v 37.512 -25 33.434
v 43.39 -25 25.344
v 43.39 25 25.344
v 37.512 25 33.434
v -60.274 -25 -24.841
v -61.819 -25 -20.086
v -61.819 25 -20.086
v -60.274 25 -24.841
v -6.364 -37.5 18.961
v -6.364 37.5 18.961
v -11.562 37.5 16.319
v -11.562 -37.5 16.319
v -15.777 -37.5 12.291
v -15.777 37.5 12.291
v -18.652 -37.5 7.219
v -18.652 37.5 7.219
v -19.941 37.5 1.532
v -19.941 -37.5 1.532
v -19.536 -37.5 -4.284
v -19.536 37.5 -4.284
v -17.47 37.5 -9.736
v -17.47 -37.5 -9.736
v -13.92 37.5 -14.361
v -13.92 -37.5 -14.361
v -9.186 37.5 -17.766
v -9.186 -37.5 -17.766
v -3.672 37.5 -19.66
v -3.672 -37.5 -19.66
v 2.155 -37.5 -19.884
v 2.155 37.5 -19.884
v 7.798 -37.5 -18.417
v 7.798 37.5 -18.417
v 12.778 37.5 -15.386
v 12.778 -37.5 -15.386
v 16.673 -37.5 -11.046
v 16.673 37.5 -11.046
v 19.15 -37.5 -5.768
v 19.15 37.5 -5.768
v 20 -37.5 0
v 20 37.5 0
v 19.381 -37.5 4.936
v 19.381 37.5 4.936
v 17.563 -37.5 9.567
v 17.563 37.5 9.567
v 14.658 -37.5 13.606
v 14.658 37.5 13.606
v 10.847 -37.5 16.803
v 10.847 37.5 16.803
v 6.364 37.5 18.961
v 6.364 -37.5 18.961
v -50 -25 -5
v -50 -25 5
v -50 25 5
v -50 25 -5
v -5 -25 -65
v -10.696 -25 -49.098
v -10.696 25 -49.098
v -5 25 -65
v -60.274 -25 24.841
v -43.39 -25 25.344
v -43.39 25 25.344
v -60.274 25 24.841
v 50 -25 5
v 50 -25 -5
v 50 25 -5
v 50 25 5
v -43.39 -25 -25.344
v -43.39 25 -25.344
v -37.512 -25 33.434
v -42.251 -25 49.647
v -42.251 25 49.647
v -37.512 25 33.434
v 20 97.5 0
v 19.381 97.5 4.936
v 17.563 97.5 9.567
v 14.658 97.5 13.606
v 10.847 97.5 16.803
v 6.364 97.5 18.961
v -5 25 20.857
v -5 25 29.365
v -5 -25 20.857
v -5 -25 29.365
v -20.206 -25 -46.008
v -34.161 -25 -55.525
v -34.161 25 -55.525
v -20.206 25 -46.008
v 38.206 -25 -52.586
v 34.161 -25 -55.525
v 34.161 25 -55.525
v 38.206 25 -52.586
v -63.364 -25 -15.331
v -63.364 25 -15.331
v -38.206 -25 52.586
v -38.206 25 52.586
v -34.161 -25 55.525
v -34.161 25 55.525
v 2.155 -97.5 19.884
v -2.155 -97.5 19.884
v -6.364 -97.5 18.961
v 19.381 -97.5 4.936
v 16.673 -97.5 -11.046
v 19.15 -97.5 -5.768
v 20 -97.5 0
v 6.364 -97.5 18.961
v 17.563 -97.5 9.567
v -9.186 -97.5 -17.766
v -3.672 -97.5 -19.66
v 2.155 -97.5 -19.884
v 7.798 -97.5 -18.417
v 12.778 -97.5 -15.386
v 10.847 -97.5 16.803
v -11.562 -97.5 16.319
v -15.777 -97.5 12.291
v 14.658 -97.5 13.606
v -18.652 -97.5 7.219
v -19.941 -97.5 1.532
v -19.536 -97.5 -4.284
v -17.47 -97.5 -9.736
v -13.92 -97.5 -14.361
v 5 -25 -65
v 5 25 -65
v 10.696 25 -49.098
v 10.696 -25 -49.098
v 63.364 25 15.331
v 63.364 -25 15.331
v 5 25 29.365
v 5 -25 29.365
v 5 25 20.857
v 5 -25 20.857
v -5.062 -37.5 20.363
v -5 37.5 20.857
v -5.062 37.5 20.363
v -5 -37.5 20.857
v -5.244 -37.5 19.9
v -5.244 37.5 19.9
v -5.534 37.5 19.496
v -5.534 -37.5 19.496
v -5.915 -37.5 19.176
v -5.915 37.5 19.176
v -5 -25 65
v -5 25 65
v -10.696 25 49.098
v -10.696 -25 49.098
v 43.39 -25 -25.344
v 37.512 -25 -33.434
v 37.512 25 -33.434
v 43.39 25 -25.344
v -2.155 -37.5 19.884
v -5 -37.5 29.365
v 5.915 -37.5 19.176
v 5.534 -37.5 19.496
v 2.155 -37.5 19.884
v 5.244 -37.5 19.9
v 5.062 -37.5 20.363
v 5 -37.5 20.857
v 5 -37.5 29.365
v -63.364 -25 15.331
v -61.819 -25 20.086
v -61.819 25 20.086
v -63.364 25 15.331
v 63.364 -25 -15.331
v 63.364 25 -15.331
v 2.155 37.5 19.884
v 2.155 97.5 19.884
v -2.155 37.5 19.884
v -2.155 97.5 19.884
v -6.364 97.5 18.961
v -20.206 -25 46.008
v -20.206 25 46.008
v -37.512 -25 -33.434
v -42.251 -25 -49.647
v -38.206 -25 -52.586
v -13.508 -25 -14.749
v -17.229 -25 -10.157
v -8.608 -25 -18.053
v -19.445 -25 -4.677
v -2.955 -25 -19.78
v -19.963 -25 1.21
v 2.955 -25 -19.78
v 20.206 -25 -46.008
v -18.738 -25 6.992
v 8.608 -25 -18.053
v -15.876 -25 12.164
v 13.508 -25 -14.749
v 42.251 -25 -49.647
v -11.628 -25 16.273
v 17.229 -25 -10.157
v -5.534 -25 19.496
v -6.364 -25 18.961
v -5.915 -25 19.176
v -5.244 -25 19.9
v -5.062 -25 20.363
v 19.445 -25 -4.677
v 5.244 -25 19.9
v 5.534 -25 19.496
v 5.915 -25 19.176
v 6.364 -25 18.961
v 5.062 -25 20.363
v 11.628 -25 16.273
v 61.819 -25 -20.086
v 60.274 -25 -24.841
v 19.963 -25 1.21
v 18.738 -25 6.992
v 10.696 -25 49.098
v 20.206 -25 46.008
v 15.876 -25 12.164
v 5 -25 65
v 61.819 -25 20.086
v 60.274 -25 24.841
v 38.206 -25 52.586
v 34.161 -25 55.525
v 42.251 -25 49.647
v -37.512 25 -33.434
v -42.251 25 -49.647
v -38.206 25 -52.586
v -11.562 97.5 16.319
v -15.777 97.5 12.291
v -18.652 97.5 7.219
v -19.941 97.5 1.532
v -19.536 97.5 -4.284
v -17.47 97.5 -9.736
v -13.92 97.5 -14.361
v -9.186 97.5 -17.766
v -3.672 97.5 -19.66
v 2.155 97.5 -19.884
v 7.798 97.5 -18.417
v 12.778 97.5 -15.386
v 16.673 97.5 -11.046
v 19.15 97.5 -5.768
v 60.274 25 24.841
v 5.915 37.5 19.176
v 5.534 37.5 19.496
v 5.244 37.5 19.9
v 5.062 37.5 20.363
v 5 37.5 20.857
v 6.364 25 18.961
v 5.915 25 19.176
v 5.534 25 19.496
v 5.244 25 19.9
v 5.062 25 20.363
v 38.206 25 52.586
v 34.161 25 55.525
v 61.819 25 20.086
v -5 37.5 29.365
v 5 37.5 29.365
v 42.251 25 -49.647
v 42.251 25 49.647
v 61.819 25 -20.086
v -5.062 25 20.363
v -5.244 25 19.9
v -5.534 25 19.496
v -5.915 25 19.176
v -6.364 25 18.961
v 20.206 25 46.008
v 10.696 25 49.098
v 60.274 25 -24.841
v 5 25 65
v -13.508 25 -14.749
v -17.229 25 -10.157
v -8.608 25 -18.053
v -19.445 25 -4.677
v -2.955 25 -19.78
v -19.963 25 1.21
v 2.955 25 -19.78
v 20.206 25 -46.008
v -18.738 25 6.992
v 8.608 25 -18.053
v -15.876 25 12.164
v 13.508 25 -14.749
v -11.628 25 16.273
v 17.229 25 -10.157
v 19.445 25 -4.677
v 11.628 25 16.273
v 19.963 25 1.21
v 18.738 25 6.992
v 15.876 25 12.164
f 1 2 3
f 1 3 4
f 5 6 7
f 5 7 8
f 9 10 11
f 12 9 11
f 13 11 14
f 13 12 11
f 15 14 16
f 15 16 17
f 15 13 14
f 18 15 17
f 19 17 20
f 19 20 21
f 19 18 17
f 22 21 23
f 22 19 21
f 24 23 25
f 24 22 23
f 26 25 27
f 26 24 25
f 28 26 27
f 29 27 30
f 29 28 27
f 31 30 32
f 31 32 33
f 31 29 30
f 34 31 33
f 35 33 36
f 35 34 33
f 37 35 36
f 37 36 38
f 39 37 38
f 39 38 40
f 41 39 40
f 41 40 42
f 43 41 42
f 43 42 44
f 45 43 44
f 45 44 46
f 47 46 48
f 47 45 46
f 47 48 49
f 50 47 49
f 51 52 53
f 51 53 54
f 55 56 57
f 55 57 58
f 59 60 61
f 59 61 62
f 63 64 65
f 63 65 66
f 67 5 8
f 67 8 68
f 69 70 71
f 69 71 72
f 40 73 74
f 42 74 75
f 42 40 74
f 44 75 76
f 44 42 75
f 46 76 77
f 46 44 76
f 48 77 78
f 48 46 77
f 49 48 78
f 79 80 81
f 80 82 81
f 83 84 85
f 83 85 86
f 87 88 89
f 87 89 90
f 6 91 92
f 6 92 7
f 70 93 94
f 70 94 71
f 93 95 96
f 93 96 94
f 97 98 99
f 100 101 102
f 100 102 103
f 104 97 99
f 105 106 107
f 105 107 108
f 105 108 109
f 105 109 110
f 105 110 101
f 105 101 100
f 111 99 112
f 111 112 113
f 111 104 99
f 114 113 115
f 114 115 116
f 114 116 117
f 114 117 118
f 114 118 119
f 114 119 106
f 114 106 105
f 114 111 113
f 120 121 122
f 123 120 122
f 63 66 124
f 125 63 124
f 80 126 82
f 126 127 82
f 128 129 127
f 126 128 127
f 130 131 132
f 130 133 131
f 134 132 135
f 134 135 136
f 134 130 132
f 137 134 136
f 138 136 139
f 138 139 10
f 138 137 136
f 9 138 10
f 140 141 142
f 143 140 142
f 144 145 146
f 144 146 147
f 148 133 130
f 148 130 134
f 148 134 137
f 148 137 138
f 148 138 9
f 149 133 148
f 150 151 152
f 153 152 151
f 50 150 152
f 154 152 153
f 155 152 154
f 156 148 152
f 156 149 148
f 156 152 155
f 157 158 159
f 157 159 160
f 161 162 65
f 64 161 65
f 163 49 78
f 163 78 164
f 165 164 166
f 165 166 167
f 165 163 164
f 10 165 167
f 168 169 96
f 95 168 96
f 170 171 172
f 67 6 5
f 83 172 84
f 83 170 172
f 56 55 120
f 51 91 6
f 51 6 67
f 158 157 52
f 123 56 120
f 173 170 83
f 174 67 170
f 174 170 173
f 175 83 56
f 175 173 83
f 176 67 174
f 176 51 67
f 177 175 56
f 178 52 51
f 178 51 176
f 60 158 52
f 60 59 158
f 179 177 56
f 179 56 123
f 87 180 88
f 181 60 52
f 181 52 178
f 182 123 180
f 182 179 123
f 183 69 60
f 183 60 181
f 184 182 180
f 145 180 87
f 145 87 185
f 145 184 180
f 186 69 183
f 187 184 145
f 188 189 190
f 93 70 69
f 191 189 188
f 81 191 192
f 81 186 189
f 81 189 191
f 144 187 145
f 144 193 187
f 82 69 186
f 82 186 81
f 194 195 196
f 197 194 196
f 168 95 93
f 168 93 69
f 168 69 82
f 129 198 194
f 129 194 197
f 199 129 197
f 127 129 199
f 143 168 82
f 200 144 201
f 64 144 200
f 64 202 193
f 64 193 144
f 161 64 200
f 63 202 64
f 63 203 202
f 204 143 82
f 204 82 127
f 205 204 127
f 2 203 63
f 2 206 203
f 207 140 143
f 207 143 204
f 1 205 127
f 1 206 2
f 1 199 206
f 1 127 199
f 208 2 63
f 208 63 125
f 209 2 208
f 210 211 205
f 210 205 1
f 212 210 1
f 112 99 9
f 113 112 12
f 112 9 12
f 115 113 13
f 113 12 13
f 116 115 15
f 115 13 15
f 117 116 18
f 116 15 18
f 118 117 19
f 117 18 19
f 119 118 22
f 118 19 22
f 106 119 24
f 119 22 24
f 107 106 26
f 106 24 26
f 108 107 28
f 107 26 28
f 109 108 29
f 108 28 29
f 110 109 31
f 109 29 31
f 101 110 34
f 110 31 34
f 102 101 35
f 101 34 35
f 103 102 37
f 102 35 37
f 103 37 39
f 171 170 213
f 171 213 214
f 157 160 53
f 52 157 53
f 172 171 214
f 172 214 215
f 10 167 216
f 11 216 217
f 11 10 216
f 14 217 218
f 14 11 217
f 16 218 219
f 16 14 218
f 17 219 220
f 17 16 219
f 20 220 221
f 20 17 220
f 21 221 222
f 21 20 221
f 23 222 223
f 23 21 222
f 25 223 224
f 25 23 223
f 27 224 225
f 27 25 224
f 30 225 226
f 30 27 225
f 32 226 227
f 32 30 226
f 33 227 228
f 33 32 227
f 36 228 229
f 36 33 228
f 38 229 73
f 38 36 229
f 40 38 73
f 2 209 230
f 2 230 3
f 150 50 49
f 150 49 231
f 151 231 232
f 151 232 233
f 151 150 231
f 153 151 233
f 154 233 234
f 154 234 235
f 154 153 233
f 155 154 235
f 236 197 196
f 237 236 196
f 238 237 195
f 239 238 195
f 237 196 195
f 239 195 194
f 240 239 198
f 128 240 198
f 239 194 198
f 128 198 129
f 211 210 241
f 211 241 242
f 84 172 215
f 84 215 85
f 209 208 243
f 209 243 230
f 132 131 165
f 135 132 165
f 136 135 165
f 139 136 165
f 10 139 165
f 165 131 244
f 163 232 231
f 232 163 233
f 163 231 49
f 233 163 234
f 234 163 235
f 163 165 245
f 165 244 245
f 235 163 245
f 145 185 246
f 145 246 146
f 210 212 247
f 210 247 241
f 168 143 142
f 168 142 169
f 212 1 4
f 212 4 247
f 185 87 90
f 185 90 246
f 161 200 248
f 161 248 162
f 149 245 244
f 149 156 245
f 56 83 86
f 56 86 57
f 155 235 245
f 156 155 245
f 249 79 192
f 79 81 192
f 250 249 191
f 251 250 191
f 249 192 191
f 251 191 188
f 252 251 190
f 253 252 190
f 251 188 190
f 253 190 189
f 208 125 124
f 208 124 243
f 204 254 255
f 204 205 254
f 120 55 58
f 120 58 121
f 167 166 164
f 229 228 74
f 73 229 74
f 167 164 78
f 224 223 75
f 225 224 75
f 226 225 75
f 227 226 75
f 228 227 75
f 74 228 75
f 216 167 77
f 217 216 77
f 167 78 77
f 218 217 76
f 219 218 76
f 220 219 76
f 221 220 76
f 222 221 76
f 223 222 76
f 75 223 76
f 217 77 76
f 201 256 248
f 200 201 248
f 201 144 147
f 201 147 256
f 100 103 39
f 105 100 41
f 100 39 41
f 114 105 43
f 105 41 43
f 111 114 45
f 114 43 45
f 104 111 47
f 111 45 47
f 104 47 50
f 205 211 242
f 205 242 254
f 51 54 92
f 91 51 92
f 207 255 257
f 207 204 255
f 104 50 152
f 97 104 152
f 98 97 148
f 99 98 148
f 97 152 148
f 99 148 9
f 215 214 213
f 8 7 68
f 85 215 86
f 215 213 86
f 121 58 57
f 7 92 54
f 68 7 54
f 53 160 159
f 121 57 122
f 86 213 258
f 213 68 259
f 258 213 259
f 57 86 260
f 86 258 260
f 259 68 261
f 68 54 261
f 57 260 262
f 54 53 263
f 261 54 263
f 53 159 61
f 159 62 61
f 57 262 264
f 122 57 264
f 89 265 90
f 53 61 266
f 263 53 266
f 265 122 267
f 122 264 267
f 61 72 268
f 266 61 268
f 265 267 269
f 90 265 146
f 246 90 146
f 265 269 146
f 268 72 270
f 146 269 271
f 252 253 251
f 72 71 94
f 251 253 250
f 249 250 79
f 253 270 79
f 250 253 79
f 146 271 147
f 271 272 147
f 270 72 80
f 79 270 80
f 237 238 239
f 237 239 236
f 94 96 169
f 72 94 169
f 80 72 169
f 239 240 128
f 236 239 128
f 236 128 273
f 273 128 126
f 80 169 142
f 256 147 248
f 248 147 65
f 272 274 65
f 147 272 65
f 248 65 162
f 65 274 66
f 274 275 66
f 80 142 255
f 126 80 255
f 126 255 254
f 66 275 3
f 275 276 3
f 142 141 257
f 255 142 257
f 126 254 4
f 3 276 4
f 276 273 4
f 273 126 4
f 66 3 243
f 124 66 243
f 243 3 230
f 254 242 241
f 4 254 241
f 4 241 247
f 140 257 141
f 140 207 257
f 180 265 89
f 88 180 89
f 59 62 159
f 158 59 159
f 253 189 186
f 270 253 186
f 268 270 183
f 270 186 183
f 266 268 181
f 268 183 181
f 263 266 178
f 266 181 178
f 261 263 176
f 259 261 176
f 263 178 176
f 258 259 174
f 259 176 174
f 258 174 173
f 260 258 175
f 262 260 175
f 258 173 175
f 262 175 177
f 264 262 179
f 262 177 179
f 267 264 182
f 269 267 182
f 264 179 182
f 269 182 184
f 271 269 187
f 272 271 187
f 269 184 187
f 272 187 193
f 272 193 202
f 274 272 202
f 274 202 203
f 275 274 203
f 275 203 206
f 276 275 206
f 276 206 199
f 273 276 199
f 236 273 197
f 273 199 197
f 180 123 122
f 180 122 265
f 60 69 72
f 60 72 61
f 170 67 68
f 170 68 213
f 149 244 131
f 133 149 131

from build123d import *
from build123d import SkipClean  # not in build123d's __all__

# Parameters (mm, degrees)
F1_DEPTH = 25
F3_DEPTH = 25
F4_DEPTH = 37.5
F6_DEPTH = 60


with BuildPart() as f1:
    # F0 (on Front) → F1 (new body, symmetric)
    with BuildSketch(Plane.XZ):
        Polygon((5, 65), (0, 65), (-5, 65), (-10.6955671373, 49.0979107866), (-20.2061323002, 46.0077408429), (-34.1609564271, 55.5250308958), (-38.206041399, 52.5861046344), (-42.2511263709, 49.6471783729), (-37.5119234573, 33.4343475865), (-43.3897759802, 25.3441776427), (-60.2735885873, 24.8413872158), (-61.8186735592, 20.0861046344), (-63.3637585311, 15.3308220529), (-50, 5), (-50, -5), (-63.3637585311, -15.3308220529), (-61.8186735592, -20.0861046344), (-60.2735885873, -24.8413872158), (-43.3897759802, -25.3441776427), (-37.5119234573, -33.4343475865), (-42.2511263709, -49.6471783729), (-38.206041399, -52.5861046344), (-34.1609564271, -55.5250308958), (-20.2061323002, -46.0077408429), (-10.6955671373, -49.0979107866), (-5, -65), (0, -65), (5, -65), (10.6955671373, -49.0979107866), (20.2061323002, -46.0077408429), (34.1609564271, -55.5250308958), (38.206041399, -52.5861046344), (42.2511263709, -49.6471783729), (37.5119234573, -33.4343475865), (43.3897759802, -25.3441776427), (60.2735885873, -24.8413872158), (61.8186735592, -20.0861046344), (63.3637585311, -15.3308220529), (50, -5), (50, 5), (63.3637585311, 15.3308220529), (61.8186735592, 20.0861046344), (60.2735885873, 24.8413872158), (43.3897759802, 25.3441776427), (37.5119234573, 33.4343475865), (42.2511263709, 49.6471783729), (38.206041399, 52.5861046344), (34.1609564271, 55.5250308958), (20.2061323002, 46.0077408429), (10.6955671373, 49.0979107866), align=None)
    extrude(amount=F1_DEPTH, both=True)

    # F2 (on Front) → F3 (cut, symmetric)
    with BuildSketch(Plane.XZ):
        with BuildLine():
            ThreePointArc((-5, 20.8566536146), (-5.3763117182, 19.6889051984), (-6.3636363636, 18.9605941951))
            ThreePointArc((-6.3636363636, 18.9605941951), (0, -20), (6.3636363636, 18.9605941951))
            ThreePointArc((6.3636363636, 18.9605941951), (5.3763117182, 19.6889051984), (5, 20.8566536146))
            Line((5, 20.8566536146), (5, 29.364916731))
            Line((5, 29.364916731), (-5, 29.364916731))
            Line((-5, 29.364916731), (-5, 20.8566536146))
        make_face()
    extrude(amount=F3_DEPTH, both=True, mode=Mode.SUBTRACT)


with BuildPart() as f4:
    # F2 (on Front) → F4 (new body, symmetric)
    with BuildSketch(Plane.XZ):
        with BuildLine():
            ThreePointArc((-5, 20.8566536146), (-5.3763117182, 19.6889051984), (-6.3636363636, 18.9605941951))
            ThreePointArc((-6.3636363636, 18.9605941951), (0, -20), (6.3636363636, 18.9605941951))
            ThreePointArc((6.3636363636, 18.9605941951), (5.3763117182, 19.6889051984), (5, 20.8566536146))
            Line((5, 20.8566536146), (5, 29.364916731))
            Line((5, 29.364916731), (-5, 29.364916731))
            Line((-5, 29.364916731), (-5, 20.8566536146))
        make_face()
    extrude(amount=F4_DEPTH, both=True)

    # F5 (on face) → F6 (join)
    with BuildSketch(Plane.XZ.offset(37.5)):
        with BuildLine():
            ThreePointArc((-6.3636363636, 18.9605941951), (-11.6774841624, -16.2368828177), (20, 0))
            ThreePointArc((20, 0), (16.2368828177, 11.6774841624), (6.3636363636, 18.9605941951))
            ThreePointArc((6.3636363636, 18.9605941951), (0, 20), (-6.3636363636, 18.9605941951))
        make_face()
    with SkipClean():  # cleaning this boolean's faces spoils the solid; the shape is the same uncleaned
        extrude(amount=F6_DEPTH)

    # F7: F4 across plane


with BuildPart() as f4_1:
    add(f4.part, clean=False)
    with SkipClean():  # cleaning this boolean's faces spoils the solid; the shape is the same uncleaned
        add(f4.part.mirror(Plane.XZ), clean=False)


solid = Compound([f1.part, f4_1.part])
